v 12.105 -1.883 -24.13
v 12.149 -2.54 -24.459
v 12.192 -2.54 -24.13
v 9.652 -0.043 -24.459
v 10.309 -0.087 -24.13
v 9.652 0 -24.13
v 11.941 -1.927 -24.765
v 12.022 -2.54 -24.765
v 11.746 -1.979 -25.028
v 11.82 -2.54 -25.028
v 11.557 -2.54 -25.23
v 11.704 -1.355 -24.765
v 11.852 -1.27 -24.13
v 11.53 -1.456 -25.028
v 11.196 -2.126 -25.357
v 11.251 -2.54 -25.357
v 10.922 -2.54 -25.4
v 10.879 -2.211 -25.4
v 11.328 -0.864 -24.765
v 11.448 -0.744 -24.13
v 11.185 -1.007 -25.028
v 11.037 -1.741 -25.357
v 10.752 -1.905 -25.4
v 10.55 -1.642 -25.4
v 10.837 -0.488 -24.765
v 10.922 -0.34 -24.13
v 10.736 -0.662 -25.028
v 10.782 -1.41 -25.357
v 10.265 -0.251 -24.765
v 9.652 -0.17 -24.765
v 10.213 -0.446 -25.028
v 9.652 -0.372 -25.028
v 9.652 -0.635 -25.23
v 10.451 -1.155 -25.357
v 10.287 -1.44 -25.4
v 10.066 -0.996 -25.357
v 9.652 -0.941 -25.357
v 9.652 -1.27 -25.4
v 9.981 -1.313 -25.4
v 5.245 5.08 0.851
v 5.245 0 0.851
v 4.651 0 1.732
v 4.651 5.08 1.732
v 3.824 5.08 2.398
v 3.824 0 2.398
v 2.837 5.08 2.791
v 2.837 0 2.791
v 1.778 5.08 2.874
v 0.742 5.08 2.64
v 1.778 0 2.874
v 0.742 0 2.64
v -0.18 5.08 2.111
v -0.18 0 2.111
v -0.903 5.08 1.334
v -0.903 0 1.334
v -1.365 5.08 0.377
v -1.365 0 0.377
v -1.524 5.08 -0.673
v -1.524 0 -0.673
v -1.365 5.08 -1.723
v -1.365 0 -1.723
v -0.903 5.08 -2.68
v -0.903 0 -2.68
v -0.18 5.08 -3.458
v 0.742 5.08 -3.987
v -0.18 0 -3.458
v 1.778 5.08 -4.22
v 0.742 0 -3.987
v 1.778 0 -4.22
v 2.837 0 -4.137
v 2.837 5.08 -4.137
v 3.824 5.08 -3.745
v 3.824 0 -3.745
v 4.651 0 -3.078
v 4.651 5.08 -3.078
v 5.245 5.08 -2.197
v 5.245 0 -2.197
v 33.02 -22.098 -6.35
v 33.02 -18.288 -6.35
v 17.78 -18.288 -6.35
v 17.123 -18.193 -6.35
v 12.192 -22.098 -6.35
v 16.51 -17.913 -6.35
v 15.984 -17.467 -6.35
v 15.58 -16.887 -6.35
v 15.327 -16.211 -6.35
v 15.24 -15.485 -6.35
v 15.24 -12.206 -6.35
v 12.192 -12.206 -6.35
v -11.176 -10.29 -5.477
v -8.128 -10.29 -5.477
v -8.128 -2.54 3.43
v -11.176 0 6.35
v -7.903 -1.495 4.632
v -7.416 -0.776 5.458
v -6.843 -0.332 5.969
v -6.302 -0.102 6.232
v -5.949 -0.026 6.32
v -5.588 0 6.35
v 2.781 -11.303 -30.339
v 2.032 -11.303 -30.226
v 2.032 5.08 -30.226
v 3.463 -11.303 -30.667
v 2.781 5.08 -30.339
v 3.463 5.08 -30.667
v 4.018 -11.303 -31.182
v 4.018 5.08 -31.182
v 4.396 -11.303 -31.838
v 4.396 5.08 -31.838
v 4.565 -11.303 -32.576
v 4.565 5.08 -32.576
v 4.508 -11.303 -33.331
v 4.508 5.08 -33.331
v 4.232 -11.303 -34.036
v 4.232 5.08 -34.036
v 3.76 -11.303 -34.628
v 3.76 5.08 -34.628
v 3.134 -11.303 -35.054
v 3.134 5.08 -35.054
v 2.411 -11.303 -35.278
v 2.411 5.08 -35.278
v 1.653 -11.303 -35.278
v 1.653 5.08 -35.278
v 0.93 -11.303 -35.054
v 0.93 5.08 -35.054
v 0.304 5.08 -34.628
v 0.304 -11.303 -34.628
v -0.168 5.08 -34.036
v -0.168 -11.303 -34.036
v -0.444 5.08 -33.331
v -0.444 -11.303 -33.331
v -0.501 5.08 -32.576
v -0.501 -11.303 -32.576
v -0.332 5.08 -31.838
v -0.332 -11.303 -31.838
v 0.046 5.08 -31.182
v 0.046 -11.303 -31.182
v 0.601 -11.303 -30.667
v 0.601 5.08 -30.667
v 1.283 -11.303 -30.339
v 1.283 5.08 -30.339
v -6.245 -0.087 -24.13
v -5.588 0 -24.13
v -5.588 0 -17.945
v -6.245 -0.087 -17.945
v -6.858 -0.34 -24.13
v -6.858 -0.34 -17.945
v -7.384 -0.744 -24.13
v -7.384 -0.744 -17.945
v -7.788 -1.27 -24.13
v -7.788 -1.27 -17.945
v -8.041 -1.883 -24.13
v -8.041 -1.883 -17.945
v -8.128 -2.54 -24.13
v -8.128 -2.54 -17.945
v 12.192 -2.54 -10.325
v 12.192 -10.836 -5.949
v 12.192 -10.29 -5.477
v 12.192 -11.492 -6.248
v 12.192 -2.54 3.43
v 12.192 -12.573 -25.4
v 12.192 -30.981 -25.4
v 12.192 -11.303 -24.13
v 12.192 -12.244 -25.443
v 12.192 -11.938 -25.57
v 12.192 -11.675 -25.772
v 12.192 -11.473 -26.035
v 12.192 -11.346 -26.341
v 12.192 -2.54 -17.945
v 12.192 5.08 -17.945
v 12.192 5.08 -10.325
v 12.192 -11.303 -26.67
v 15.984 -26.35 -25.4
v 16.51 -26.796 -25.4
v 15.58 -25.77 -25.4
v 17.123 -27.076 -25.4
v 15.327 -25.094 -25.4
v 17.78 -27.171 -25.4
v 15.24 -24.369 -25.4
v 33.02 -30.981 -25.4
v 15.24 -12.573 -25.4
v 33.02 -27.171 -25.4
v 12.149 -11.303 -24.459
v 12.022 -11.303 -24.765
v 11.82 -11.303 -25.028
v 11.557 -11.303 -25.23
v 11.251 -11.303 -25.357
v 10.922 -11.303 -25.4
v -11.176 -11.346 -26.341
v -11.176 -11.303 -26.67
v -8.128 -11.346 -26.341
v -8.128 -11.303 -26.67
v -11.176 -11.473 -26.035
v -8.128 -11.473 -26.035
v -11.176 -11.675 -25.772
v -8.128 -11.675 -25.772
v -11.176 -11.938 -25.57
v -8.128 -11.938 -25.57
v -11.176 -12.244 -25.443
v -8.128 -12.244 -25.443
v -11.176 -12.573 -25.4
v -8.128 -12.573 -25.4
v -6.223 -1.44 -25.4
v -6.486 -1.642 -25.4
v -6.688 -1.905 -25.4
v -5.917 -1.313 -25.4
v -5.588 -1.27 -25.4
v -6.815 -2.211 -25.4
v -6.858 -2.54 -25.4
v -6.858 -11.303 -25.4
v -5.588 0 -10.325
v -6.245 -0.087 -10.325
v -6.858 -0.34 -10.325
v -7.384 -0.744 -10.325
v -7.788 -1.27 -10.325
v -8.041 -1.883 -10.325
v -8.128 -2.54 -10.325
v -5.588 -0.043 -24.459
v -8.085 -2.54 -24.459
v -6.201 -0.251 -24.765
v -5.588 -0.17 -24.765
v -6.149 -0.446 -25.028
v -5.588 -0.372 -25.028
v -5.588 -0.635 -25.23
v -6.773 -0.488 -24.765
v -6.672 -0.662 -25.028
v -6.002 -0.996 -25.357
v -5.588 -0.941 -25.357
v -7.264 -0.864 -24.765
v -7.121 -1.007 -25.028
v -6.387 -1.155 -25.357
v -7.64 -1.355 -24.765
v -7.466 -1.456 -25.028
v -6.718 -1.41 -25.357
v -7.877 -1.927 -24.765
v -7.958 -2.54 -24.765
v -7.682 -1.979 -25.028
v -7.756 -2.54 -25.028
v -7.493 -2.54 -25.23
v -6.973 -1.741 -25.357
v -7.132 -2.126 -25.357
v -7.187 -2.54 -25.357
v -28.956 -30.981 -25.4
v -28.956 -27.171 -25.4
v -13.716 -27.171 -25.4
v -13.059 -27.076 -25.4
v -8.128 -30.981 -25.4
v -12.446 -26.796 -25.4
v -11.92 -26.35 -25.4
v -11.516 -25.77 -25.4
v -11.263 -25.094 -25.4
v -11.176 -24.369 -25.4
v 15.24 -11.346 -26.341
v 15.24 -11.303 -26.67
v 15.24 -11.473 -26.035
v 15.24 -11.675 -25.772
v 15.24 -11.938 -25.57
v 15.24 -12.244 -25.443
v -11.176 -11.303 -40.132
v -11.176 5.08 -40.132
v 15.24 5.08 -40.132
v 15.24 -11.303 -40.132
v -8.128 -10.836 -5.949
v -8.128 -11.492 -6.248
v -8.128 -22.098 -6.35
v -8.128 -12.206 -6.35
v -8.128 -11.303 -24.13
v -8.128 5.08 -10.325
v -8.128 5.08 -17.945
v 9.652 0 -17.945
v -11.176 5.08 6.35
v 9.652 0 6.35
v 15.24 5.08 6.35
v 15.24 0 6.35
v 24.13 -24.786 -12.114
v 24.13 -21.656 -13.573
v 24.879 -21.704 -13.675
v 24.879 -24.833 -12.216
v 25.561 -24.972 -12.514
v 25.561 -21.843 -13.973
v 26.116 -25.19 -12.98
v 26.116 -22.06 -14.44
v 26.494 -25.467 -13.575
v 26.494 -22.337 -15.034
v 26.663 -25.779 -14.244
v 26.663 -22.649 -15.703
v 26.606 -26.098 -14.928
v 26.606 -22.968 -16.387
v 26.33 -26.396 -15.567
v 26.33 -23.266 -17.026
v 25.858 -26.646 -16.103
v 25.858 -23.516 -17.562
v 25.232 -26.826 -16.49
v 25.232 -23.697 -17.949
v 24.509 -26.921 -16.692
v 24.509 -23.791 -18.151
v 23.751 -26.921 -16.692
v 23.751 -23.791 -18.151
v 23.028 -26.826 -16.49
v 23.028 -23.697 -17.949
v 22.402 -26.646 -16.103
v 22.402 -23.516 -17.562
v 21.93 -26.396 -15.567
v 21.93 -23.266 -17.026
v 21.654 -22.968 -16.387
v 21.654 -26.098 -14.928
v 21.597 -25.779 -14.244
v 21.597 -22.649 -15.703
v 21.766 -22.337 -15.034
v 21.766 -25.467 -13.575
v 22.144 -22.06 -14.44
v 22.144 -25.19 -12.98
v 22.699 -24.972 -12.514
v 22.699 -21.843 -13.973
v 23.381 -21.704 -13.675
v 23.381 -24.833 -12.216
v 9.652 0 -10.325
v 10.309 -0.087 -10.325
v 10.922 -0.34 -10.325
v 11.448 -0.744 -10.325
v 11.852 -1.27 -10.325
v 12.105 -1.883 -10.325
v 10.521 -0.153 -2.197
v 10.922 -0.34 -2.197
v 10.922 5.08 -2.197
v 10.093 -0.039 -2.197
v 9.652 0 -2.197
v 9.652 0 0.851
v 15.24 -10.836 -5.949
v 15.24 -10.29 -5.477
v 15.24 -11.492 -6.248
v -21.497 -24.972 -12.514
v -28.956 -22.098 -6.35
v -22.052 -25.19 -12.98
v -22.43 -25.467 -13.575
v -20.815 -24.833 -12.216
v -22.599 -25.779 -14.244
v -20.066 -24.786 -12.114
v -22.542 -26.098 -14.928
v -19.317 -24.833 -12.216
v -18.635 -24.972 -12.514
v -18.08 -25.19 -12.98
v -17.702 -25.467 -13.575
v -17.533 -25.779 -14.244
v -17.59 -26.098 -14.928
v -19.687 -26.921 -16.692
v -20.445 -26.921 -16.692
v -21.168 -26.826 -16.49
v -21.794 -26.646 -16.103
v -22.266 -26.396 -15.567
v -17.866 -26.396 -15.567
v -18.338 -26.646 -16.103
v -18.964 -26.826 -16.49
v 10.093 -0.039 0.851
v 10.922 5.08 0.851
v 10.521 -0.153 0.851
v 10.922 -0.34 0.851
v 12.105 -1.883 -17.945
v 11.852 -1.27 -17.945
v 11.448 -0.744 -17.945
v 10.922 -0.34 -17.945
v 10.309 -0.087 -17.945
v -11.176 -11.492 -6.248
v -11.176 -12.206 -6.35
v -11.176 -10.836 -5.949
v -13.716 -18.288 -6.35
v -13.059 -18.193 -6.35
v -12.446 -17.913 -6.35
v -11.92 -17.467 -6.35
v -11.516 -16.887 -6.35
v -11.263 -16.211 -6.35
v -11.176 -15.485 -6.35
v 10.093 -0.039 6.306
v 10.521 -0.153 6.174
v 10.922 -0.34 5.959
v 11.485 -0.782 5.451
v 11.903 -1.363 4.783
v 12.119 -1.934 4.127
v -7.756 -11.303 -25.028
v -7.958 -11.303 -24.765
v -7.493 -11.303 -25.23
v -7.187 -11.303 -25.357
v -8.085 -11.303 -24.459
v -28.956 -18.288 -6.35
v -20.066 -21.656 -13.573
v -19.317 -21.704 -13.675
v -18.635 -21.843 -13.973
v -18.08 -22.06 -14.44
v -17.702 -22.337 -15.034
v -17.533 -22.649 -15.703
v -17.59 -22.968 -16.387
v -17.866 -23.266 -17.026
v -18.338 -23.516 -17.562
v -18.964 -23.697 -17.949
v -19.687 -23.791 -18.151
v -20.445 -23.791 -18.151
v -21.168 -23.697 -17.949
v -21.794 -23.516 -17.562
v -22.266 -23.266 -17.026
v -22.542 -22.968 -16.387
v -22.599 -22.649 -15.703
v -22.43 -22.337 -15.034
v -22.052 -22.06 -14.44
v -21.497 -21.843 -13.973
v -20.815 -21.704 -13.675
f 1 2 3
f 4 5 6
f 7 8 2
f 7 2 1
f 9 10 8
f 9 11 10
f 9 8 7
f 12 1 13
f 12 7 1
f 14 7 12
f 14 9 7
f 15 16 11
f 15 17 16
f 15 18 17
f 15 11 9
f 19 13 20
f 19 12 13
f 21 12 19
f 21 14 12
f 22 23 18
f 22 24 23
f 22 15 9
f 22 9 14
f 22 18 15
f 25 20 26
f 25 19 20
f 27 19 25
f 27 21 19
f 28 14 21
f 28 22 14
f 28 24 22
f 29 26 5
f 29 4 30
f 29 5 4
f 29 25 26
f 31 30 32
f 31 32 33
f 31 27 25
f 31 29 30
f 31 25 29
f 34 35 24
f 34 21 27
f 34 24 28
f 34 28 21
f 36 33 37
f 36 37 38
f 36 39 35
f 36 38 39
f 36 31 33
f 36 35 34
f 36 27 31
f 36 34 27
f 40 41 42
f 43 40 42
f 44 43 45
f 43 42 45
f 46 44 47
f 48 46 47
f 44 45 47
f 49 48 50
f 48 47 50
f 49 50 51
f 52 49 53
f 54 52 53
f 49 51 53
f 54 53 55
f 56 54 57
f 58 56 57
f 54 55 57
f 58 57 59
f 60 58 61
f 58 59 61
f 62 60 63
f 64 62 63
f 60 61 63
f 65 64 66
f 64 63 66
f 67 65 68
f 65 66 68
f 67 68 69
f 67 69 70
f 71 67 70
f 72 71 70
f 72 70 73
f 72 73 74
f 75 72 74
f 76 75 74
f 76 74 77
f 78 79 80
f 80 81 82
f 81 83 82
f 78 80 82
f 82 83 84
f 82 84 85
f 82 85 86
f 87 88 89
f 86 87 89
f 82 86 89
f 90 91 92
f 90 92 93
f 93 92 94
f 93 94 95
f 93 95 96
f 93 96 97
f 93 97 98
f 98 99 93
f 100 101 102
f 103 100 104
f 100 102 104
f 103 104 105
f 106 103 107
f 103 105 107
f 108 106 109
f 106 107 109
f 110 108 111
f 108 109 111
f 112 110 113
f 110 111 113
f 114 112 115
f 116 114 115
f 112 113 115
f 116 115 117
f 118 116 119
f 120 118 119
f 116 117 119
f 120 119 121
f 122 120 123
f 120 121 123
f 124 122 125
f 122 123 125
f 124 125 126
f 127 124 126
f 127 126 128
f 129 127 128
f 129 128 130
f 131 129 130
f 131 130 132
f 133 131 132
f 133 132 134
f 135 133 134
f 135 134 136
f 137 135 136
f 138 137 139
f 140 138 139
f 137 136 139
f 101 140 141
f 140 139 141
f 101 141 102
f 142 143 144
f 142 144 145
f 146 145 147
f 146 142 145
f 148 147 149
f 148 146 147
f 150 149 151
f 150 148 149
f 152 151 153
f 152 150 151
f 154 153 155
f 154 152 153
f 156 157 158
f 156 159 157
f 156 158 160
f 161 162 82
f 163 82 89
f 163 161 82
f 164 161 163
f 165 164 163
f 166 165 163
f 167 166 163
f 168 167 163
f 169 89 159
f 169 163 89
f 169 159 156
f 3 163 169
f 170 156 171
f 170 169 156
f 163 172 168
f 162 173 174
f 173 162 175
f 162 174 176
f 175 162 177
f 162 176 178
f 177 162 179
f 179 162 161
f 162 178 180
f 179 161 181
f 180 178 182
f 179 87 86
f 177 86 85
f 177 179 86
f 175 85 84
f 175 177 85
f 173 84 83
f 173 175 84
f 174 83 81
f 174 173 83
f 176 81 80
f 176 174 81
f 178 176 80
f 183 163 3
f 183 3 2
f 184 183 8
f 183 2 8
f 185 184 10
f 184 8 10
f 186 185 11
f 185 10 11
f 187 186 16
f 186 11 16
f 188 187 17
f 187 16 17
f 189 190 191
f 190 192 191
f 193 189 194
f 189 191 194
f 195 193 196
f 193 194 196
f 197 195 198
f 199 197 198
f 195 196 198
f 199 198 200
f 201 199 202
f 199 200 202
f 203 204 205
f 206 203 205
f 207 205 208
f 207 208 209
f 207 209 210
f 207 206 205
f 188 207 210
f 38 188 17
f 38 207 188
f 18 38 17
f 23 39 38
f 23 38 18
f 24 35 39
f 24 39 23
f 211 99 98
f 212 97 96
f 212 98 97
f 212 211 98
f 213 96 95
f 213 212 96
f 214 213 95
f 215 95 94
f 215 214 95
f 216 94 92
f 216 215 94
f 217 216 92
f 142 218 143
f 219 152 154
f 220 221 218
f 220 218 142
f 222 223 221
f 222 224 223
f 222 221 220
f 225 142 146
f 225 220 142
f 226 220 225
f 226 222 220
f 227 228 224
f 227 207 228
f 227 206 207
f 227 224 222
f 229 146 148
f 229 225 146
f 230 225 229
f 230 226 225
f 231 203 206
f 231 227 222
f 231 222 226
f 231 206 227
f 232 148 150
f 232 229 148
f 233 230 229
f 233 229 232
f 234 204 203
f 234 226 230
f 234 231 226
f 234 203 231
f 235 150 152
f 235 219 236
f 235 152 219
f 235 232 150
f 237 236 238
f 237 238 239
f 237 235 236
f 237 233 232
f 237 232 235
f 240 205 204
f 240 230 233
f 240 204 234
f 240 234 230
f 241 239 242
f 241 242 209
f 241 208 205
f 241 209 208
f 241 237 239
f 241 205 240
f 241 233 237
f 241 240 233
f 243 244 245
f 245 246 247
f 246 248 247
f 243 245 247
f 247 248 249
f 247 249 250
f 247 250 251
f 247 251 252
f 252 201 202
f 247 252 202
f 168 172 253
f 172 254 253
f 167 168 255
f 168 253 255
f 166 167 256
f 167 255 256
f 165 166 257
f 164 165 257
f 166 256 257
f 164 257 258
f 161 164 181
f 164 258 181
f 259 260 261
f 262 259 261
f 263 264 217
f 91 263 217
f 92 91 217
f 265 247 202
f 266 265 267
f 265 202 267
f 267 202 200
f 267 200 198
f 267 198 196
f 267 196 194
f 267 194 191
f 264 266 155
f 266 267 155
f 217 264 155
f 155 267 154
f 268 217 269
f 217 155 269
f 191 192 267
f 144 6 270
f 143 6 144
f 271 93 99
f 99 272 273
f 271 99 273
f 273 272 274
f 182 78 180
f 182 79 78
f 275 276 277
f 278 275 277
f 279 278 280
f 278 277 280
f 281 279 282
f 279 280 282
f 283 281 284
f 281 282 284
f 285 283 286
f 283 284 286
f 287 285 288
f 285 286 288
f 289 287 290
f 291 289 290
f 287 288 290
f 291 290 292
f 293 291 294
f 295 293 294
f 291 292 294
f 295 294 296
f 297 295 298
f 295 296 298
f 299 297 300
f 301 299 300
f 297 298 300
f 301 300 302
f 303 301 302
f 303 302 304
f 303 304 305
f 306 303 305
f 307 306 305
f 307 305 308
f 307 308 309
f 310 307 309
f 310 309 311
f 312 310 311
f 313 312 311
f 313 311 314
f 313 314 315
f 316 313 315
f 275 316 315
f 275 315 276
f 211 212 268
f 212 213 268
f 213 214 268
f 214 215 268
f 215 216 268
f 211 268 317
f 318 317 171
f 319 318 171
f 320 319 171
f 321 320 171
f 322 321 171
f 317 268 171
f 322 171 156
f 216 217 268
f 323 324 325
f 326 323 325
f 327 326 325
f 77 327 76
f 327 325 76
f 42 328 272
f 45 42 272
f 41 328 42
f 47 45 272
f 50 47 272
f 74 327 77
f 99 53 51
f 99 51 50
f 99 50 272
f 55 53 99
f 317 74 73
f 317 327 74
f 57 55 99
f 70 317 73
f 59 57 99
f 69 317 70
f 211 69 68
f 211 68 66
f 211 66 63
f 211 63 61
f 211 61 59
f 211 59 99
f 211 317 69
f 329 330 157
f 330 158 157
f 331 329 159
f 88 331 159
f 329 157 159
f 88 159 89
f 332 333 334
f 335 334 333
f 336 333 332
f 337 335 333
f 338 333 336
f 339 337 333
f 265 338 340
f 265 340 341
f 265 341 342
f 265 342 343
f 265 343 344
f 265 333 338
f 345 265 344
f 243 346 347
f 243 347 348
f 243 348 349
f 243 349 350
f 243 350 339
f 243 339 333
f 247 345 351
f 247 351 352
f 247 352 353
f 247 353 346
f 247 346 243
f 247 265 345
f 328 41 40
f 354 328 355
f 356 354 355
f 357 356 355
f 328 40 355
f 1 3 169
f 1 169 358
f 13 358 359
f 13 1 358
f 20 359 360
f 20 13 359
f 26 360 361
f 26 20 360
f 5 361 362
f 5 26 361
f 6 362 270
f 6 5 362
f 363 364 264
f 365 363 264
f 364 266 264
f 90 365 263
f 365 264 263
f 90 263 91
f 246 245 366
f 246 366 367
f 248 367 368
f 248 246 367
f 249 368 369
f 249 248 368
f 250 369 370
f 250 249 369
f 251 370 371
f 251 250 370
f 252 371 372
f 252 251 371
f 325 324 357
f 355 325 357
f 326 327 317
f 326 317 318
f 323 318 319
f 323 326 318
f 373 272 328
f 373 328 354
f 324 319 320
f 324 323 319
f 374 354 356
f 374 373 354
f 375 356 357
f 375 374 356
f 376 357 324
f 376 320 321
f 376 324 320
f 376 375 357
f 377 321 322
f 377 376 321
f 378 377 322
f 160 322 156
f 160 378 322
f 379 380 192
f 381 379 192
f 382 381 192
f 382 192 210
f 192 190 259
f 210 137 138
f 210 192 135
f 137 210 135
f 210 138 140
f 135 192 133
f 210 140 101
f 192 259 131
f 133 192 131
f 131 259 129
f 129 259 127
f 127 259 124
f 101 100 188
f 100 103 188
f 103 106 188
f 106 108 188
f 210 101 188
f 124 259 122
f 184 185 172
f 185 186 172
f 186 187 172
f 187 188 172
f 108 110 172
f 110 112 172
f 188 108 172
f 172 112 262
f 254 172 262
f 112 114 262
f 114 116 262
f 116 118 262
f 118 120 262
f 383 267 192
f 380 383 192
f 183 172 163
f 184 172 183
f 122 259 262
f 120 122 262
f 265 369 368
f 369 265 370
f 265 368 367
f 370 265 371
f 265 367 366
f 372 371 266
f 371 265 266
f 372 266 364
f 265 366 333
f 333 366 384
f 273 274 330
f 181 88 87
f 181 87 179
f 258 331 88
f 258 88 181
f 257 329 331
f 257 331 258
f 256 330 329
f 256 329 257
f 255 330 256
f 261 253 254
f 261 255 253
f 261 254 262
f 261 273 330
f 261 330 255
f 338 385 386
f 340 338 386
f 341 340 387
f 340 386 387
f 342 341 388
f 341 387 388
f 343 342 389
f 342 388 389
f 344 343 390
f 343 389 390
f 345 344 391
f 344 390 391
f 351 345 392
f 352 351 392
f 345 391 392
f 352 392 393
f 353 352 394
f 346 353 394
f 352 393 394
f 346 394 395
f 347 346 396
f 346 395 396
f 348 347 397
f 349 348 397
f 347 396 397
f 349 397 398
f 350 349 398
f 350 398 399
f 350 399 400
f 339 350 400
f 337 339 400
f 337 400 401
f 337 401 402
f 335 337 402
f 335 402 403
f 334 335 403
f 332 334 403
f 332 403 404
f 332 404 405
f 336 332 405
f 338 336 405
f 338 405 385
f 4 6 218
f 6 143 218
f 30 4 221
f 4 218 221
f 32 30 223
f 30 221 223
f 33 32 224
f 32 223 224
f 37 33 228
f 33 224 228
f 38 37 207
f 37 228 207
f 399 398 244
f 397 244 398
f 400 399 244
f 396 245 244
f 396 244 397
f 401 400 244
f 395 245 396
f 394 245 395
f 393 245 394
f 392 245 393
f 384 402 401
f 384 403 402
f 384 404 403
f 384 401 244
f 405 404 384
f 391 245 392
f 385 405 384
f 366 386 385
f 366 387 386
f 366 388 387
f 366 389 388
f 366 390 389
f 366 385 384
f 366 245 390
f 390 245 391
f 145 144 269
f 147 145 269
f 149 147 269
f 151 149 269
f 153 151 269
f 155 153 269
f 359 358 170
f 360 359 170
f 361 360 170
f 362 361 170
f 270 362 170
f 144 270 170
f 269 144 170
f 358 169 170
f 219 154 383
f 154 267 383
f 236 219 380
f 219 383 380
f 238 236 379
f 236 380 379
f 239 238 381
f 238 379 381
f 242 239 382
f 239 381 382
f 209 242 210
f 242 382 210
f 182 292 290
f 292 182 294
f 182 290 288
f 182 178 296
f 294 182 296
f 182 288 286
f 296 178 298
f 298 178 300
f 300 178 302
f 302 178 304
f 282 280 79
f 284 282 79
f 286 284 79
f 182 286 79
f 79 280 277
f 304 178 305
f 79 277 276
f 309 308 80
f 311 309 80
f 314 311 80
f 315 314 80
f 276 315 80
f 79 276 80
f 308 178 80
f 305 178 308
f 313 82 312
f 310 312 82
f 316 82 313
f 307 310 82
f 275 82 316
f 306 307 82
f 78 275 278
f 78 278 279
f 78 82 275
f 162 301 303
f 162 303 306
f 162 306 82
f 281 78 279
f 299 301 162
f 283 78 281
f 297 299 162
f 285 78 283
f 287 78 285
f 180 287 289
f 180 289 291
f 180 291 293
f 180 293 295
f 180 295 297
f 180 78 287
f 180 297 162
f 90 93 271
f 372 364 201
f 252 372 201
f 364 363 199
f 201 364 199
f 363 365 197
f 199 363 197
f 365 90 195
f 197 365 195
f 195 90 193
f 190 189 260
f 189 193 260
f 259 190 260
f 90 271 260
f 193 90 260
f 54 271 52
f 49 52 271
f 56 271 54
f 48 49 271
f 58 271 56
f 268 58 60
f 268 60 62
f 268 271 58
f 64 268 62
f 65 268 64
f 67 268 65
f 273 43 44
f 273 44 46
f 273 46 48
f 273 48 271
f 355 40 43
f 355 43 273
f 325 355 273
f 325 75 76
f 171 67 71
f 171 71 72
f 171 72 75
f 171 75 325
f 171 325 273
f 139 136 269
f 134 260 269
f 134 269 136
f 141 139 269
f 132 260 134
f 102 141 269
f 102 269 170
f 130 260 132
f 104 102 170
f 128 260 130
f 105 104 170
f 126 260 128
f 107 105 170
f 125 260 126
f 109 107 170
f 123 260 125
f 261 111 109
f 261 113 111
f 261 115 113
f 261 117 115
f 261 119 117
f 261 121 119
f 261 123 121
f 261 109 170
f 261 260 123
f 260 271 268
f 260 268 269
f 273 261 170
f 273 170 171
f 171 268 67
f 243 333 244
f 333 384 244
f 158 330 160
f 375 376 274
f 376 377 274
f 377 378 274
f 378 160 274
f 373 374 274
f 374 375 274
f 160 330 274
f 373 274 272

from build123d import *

# Parameters (mm, degrees)
SKETCH1_W           = 26.416
SKETCH1_H           = 31.75
BOSS_EXTRUDE1_DEPTH = 5.08
SKETCH2_W           = 16.51
SKETCH2_H           = 7.62
SKETCH2_W_2         = 3.81
CUT_EXTRUDE1_DEPTH  = 5.08
SKETCH3_W           = 19.05
SKETCH3_H           = 22.098
BOSS_EXTRUDE2_DEPTH = 26.416
BOSS_EXTRUDE3_DEPTH = 3.048
BOSS_EXTRUDE4_DEPTH = 3.048
BOSS_EXTRUDE5_DEPTH = 17.78
BOSS_EXTRUDE6_DEPTH = 17.78
SKETCH10_R          = 2.54
CUT_EXTRUDE3_DEPTH  = 17.78
SKETCH11_W          = 20.32
SKETCH11_H          = 30.981160888
CUT_EXTRUDE4_DEPTH  = 22.86
FILLET3_R           = 2.54
FILLET4_R           = 2.54
SKETCH12_W          = 26.416
SKETCH12_H          = 14.732
SKETCH12_R          = 2.54
BOSS_EXTRUDE7_DEPTH = 16.383
FILLET5_R           = 1.27
FILLET6_R           = 1.27


with BuildPart() as part:
    # Sketch1 → Boss-Extrude1 (new body)
    with BuildSketch(Plane(origin=(0, 0, 0), x_dir=(1, 0, 0), z_dir=(0, 1, 0))):
        with Locations((2.032, 9.525)):
            Rectangle(SKETCH1_W, SKETCH1_H)
        with BuildLine():
            ThreePointArc((5.244874103, -0.8509), (-1.524, 0.6731), (5.244874103, 2.1971))
            Line((5.244874103, 2.1971), (10.922, 2.1971))
            Line((10.922, 2.1971), (10.922, -0.8509))
            Line((10.922, -0.8509), (5.244874103, -0.8509))
        make_face(mode=Mode.SUBTRACT)
    extrude(amount=BOSS_EXTRUDE1_DEPTH)

    # Sketch2 → Cut-Extrude1 (cut)
    with BuildSketch(Plane(origin=(0, 5.08, 0), x_dir=(1, 0, 0), z_dir=(0, 1, 0))):
        with Locations((0.127, 14.1351)):
            Rectangle(SKETCH2_W, SKETCH2_H)
        with Locations((10.287, 14.1351)):
            Rectangle(SKETCH2_W_2, SKETCH2_H)
    extrude(amount=-CUT_EXTRUDE1_DEPTH, mode=Mode.SUBTRACT)

    # Sketch3 → Boss-Extrude2 (add)
    with BuildSketch(Plane.ZY.offset(11.176)):
        with Locations((-15.875, -11.049)):
            Rectangle(SKETCH3_W, SKETCH3_H)
        Polygon((-25.4, -22.098), (-6.35, -22.098), (-25.4, -30.981160888), align=None)
    extrude(amount=-BOSS_EXTRUDE2_DEPTH)

    # Sketch6 → Boss-Extrude3 (add)
    with BuildSketch(Plane.ZY.offset(11.176)):
        Polygon((6.35, 0), (-6.35, -11.049), (-6.35, 0), align=None)
    extrude(amount=-BOSS_EXTRUDE3_DEPTH)

    # Sketch7 → Boss-Extrude4 (add)
    with BuildSketch(Plane(origin=(15.24, 0, 0), x_dir=(0, 0, -1), z_dir=(1, 0, 0))):
        Polygon((-6.35, 0), (6.35, -11.049), (6.35, 0), align=None)
    extrude(amount=-BOSS_EXTRUDE4_DEPTH)

    # Sketch8 → Boss-Extrude5 (add)
    with BuildSketch(Plane(origin=(15.24, 0, 0), x_dir=(0, 0, -1), z_dir=(1, 0, 0))):
        Polygon((6.35, -22.098), (25.4, -30.981160888), (25.4, -27.171160888), (6.35, -18.288), align=None)
    extrude(amount=BOSS_EXTRUDE5_DEPTH)

    # Sketch9 → Boss-Extrude6 (add)
    with BuildSketch(Plane.ZY.offset(11.176)):
        Polygon((-6.35, -22.098), (-25.4, -30.981160888), (-25.4, -27.171160888), (-6.35, -18.288), align=None)
    extrude(amount=BOSS_EXTRUDE6_DEPTH)

    # Sketch10 → Cut-Extrude3 (cut)
    with BuildSketch(Plane(origin=(0, -12.589458796, 5.870561049), x_dir=(1, 0, 0), z_dir=(0, 0.9063077870366494, -0.42261826174070083))):
        with Locations(Location((24.13, 23.993528218, 0), (0, 0, 270))):
            Circle(SKETCH10_R)
        with Locations(Location((-20.066, 23.993528218, 0), (0, 0, 270))):
            Circle(SKETCH10_R)
    extrude(amount=-CUT_EXTRUDE3_DEPTH, mode=Mode.SUBTRACT)

    # Sketch11 → Cut-Extrude4 (cut)
    with BuildSketch(Plane(origin=(0, 0, -25.4), x_dir=(-1, 0, 0), z_dir=(0, 0, -1))):
        with Locations((-2.032, -15.490580444)):
            Rectangle(SKETCH11_W, SKETCH11_H)
    extrude(amount=-CUT_EXTRUDE4_DEPTH, mode=Mode.SUBTRACT)

    # Fillet3
    # the kernel refuses this fillet: 2.54 mm, written as the material it adds along each edge
    with BuildSketch(Plane(origin=(-8.128, 0, -25.4), x_dir=(0, -1, 0), z_dir=(0, 0, 1)), Plane(origin=(12.192, 0, -25.4), x_dir=(-1, 0, 0), z_dir=(0, 0, 1))) as fillet3_piece_1:
        with BuildLine():
            CenterArc((FILLET3_R, FILLET3_R), FILLET3_R, 180, 90)
            Line((0, FILLET3_R), (0, 0))
            Line((0, 0), (FILLET3_R, 0))
        make_face()
    extrude(amount=7.4549)
    with BuildSketch(Plane(origin=(-8.128, 0, -10.3251), x_dir=(1, 0, 0), z_dir=(0, 0, 1))) as fillet3_piece_2_section:
        with BuildLine():
            CenterArc((FILLET3_R, -FILLET3_R), FILLET3_R, 90, 90)
            Line((0, -FILLET3_R), (0, 0))
            Line((0, 0), (FILLET3_R, 0))
        make_face()
    fillet3_piece_2 = extrude(amount=16.6751, mode=Mode.PRIVATE)
    fillet3_piece_2 = split(fillet3_piece_2, bisect_by=Plane(origin=(-7.540337897, -4.52533198, 1.148468989), z_dir=(0, 0.7544430785777146, -0.6563654783626119)), keep=Keep.TOP, mode=Mode.PRIVATE)
    add(fillet3_piece_2)
    with BuildSketch(Plane(origin=(12.192, 0, 6.35), x_dir=(-1, 0, 0), z_dir=(0, 0, -1))) as fillet3_piece_3_section:
        with BuildLine():
            CenterArc((FILLET3_R, -FILLET3_R), FILLET3_R, 90, 90)
            Line((0, -FILLET3_R), (0, 0))
            Line((0, 0), (FILLET3_R, 0))
        make_face()
    fillet3_piece_3 = extrude(amount=16.6751, mode=Mode.PRIVATE)
    fillet3_piece_3 = split(fillet3_piece_3, bisect_by=Plane(origin=(10.504295152, -0.059519406, 0.8509), z_dir=(0, 0, 1)), keep=Keep.TOP, mode=Mode.PRIVATE)
    fillet3_piece_3 = split(fillet3_piece_3, bisect_by=Plane(origin=(10.922, -0.059519406, 3.561570264), z_dir=(-1, 0, 0)), keep=Keep.TOP, mode=Mode.PRIVATE)
    fillet3_piece_3 = split(fillet3_piece_3, bisect_by=Plane(origin=(10.504295152, -1.406445505, 4.733395971), z_dir=(0, 0.7544430785777146, -0.6563654783626119)), keep=Keep.TOP, mode=Mode.PRIVATE)
    add(fillet3_piece_3)
    with BuildSketch(Plane(origin=(12.192, 0, 6.35), x_dir=(-1, 0, 0), z_dir=(0, 0, -1))) as fillet3_piece_4_section:
        with BuildLine():
            CenterArc((FILLET3_R, -FILLET3_R), FILLET3_R, 90, 90)
            Line((0, -FILLET3_R), (0, 0))
            Line((0, 0), (FILLET3_R, 0))
        make_face()
    fillet3_piece_4 = extrude(amount=16.6751, mode=Mode.PRIVATE)
    fillet3_piece_4 = split(fillet3_piece_4, bisect_by=Plane(origin=(11.748492429, -0.576014265, 0.8509), z_dir=(0, 0, 1)), keep=Keep.TOP, mode=Mode.PRIVATE)
    fillet3_piece_4 = split(fillet3_piece_4, bisect_by=Plane(origin=(10.922, -0.576014265, 3.268620732), z_dir=(1, 0, 0)), keep=Keep.TOP, mode=Mode.PRIVATE)
    fillet3_piece_4 = split(fillet3_piece_4, bisect_by=Plane(origin=(11.748492429, -1.774025363, 4.310890388), z_dir=(0, 0.7544430785777146, -0.6563654783626119)), keep=Keep.TOP, mode=Mode.PRIVATE)
    add(fillet3_piece_4)
    with BuildSketch(Plane(origin=(12.192, 0, 6.35), x_dir=(-1, 0, 0), z_dir=(0, 0, -1))) as fillet3_piece_5_section:
        with BuildLine():
            CenterArc((FILLET3_R, -FILLET3_R), FILLET3_R, 90, 90)
            Line((0, -FILLET3_R), (0, 0))
            Line((0, 0), (FILLET3_R, 0))
        make_face()
    fillet3_piece_5 = extrude(amount=16.6751, mode=Mode.PRIVATE)
    fillet3_piece_5 = split(fillet3_piece_5, bisect_by=Plane(origin=(11.774444919, -0.648004952, 0.8509), z_dir=(0, 0, -1)), keep=Keep.TOP, mode=Mode.PRIVATE)
    fillet3_piece_5 = split(fillet3_piece_5, bisect_by=Plane(origin=(10.922, -0.648004952, -0.6731), z_dir=(1, 0, 0)), keep=Keep.TOP, mode=Mode.PRIVATE)
    fillet3_piece_5 = split(fillet3_piece_5, bisect_by=Plane(origin=(11.774444919, -0.648004952, -2.1971), z_dir=(0, 0, 1)), keep=Keep.TOP, mode=Mode.PRIVATE)
    add(fillet3_piece_5)
    with BuildSketch(Plane(origin=(12.192, 0, 6.35), x_dir=(-1, 0, 0), z_dir=(0, 0, -1))) as fillet3_piece_6_section:
        with BuildLine():
            CenterArc((FILLET3_R, -FILLET3_R), FILLET3_R, 90, 90)
            Line((0, -FILLET3_R), (0, 0))
            Line((0, 0), (FILLET3_R, 0))
        make_face()
    fillet3_piece_6 = extrude(amount=16.6751, mode=Mode.PRIVATE)
    fillet3_piece_6 = split(fillet3_piece_6, bisect_by=Plane(origin=(10.922, -0.060981289, -6.2611), z_dir=(-1, 0, 0)), keep=Keep.TOP, mode=Mode.PRIVATE)
    fillet3_piece_6 = split(fillet3_piece_6, bisect_by=Plane(origin=(10.507343007, -0.060981289, -2.1971), z_dir=(0, 0, -1)), keep=Keep.TOP, mode=Mode.PRIVATE)
    add(fillet3_piece_6)
    with BuildSketch(Plane(origin=(12.192, 0, 6.35), x_dir=(-1, 0, 0), z_dir=(0, 0, -1))) as fillet3_piece_7_section:
        with BuildLine():
            CenterArc((FILLET3_R, -FILLET3_R), FILLET3_R, 90, 90)
            Line((0, -FILLET3_R), (0, 0))
            Line((0, 0), (FILLET3_R, 0))
        make_face()
    fillet3_piece_7 = extrude(amount=16.6751, mode=Mode.PRIVATE)
    fillet3_piece_7 = split(fillet3_piece_7, bisect_by=Plane(origin=(10.922, -0.648004952, -6.2611), z_dir=(1, 0, 0)), keep=Keep.TOP, mode=Mode.PRIVATE)
    fillet3_piece_7 = split(fillet3_piece_7, bisect_by=Plane(origin=(11.774444919, -0.648004952, -2.1971), z_dir=(0, 0, -1)), keep=Keep.TOP, mode=Mode.PRIVATE)
    add(fillet3_piece_7)
    with BuildSketch(Plane(origin=(15.24, -29.85478685, -31.155054448), x_dir=(1, 0, 0), z_dir=(0, 0.42261826174070066, 0.9063077870366494))) as fillet3_piece_8_section:
        with BuildLine():
            CenterArc((FILLET3_R, FILLET3_R), FILLET3_R, 180, 90)
            Line((0, FILLET3_R), (0, 0))
            Line((0, 0), (FILLET3_R, 0))
        make_face()
    fillet3_piece_8 = extrude(amount=33.719349356, mode=Mode.PRIVATE)
    fillet3_piece_8 = split(fillet3_piece_8, bisect_by=Plane(origin=(15.81504359, -22.095090044, -25.4), z_dir=(0, 0, 1)), keep=Keep.TOP, mode=Mode.PRIVATE)
    fillet3_piece_8 = split(fillet3_piece_8, bisect_by=Plane(origin=(15.81504359, -22.095090044, -6.35), z_dir=(0, 0, -1)), keep=Keep.TOP, mode=Mode.PRIVATE)
    add(fillet3_piece_8)
    with BuildSketch(Plane(origin=(-11.176, -29.85478685, -31.155054448), x_dir=(0, 0.9063077870366492, -0.4226182617407009), z_dir=(0, 0.4226182617407009, 0.9063077870366493))) as fillet3_piece_9_section:
        with BuildLine():
            CenterArc((FILLET3_R, FILLET3_R), FILLET3_R, 180, 90)
            Line((0, FILLET3_R), (0, 0))
            Line((0, 0), (FILLET3_R, 0))
        make_face()
    fillet3_piece_9 = extrude(amount=33.719349356, mode=Mode.PRIVATE)
    fillet3_piece_9 = split(fillet3_piece_9, bisect_by=Plane(origin=(-11.75104359, -22.095090044, -25.4), z_dir=(0, 0, 1)), keep=Keep.TOP, mode=Mode.PRIVATE)
    fillet3_piece_9 = split(fillet3_piece_9, bisect_by=Plane(origin=(-11.75104359, -22.095090044, -6.35), z_dir=(0, 0, -1)), keep=Keep.TOP, mode=Mode.PRIVATE)
    add(fillet3_piece_9)

    # Fillet4
    fillet4_edges = [part.edges().sort_by_distance(p)[0] for p in [
        (-9.652, -11.049, -6.35),
        (13.716, -11.049, -6.35),
    ]]
    fillet(fillet4_edges, radius=FILLET4_R)

    # Sketch12 → Boss-Extrude7 (add)
    with BuildSketch(Plane(origin=(0, 5.08, 0), x_dir=(1, 0, 0), z_dir=(0, 1, 0))):
        with Locations((2.032, 32.766)):
            Rectangle(SKETCH12_W, SKETCH12_H)
        with Locations(Location((2.032, 32.766, 0), (0, 0, 270))):
            Circle(SKETCH12_R, mode=Mode.SUBTRACT)
    extrude(amount=-BOSS_EXTRUDE7_DEPTH)

    # Fillet5
    fillet5_edges = [part.edges().sort_by_distance(p)[0] for p in [
        (12.192, -6.9215, -25.4),
        (2.032, 0, -25.4),
        (-7.384051224, -0.743948776, -25.4),
        (11.448051224, -0.743948776, -25.4),
        (-8.128, -6.9215, -25.4),
    ]]
    fillet(fillet5_edges, radius=FILLET5_R)

    # Fillet6
    fillet6_edges = [part.edges().sort_by_distance(p)[0] for p in [
        (13.716, -11.303, -25.4),
        (-9.652, -11.303, -25.4),
    ]]
    fillet(fillet6_edges, radius=FILLET6_R)


solid = part.part
